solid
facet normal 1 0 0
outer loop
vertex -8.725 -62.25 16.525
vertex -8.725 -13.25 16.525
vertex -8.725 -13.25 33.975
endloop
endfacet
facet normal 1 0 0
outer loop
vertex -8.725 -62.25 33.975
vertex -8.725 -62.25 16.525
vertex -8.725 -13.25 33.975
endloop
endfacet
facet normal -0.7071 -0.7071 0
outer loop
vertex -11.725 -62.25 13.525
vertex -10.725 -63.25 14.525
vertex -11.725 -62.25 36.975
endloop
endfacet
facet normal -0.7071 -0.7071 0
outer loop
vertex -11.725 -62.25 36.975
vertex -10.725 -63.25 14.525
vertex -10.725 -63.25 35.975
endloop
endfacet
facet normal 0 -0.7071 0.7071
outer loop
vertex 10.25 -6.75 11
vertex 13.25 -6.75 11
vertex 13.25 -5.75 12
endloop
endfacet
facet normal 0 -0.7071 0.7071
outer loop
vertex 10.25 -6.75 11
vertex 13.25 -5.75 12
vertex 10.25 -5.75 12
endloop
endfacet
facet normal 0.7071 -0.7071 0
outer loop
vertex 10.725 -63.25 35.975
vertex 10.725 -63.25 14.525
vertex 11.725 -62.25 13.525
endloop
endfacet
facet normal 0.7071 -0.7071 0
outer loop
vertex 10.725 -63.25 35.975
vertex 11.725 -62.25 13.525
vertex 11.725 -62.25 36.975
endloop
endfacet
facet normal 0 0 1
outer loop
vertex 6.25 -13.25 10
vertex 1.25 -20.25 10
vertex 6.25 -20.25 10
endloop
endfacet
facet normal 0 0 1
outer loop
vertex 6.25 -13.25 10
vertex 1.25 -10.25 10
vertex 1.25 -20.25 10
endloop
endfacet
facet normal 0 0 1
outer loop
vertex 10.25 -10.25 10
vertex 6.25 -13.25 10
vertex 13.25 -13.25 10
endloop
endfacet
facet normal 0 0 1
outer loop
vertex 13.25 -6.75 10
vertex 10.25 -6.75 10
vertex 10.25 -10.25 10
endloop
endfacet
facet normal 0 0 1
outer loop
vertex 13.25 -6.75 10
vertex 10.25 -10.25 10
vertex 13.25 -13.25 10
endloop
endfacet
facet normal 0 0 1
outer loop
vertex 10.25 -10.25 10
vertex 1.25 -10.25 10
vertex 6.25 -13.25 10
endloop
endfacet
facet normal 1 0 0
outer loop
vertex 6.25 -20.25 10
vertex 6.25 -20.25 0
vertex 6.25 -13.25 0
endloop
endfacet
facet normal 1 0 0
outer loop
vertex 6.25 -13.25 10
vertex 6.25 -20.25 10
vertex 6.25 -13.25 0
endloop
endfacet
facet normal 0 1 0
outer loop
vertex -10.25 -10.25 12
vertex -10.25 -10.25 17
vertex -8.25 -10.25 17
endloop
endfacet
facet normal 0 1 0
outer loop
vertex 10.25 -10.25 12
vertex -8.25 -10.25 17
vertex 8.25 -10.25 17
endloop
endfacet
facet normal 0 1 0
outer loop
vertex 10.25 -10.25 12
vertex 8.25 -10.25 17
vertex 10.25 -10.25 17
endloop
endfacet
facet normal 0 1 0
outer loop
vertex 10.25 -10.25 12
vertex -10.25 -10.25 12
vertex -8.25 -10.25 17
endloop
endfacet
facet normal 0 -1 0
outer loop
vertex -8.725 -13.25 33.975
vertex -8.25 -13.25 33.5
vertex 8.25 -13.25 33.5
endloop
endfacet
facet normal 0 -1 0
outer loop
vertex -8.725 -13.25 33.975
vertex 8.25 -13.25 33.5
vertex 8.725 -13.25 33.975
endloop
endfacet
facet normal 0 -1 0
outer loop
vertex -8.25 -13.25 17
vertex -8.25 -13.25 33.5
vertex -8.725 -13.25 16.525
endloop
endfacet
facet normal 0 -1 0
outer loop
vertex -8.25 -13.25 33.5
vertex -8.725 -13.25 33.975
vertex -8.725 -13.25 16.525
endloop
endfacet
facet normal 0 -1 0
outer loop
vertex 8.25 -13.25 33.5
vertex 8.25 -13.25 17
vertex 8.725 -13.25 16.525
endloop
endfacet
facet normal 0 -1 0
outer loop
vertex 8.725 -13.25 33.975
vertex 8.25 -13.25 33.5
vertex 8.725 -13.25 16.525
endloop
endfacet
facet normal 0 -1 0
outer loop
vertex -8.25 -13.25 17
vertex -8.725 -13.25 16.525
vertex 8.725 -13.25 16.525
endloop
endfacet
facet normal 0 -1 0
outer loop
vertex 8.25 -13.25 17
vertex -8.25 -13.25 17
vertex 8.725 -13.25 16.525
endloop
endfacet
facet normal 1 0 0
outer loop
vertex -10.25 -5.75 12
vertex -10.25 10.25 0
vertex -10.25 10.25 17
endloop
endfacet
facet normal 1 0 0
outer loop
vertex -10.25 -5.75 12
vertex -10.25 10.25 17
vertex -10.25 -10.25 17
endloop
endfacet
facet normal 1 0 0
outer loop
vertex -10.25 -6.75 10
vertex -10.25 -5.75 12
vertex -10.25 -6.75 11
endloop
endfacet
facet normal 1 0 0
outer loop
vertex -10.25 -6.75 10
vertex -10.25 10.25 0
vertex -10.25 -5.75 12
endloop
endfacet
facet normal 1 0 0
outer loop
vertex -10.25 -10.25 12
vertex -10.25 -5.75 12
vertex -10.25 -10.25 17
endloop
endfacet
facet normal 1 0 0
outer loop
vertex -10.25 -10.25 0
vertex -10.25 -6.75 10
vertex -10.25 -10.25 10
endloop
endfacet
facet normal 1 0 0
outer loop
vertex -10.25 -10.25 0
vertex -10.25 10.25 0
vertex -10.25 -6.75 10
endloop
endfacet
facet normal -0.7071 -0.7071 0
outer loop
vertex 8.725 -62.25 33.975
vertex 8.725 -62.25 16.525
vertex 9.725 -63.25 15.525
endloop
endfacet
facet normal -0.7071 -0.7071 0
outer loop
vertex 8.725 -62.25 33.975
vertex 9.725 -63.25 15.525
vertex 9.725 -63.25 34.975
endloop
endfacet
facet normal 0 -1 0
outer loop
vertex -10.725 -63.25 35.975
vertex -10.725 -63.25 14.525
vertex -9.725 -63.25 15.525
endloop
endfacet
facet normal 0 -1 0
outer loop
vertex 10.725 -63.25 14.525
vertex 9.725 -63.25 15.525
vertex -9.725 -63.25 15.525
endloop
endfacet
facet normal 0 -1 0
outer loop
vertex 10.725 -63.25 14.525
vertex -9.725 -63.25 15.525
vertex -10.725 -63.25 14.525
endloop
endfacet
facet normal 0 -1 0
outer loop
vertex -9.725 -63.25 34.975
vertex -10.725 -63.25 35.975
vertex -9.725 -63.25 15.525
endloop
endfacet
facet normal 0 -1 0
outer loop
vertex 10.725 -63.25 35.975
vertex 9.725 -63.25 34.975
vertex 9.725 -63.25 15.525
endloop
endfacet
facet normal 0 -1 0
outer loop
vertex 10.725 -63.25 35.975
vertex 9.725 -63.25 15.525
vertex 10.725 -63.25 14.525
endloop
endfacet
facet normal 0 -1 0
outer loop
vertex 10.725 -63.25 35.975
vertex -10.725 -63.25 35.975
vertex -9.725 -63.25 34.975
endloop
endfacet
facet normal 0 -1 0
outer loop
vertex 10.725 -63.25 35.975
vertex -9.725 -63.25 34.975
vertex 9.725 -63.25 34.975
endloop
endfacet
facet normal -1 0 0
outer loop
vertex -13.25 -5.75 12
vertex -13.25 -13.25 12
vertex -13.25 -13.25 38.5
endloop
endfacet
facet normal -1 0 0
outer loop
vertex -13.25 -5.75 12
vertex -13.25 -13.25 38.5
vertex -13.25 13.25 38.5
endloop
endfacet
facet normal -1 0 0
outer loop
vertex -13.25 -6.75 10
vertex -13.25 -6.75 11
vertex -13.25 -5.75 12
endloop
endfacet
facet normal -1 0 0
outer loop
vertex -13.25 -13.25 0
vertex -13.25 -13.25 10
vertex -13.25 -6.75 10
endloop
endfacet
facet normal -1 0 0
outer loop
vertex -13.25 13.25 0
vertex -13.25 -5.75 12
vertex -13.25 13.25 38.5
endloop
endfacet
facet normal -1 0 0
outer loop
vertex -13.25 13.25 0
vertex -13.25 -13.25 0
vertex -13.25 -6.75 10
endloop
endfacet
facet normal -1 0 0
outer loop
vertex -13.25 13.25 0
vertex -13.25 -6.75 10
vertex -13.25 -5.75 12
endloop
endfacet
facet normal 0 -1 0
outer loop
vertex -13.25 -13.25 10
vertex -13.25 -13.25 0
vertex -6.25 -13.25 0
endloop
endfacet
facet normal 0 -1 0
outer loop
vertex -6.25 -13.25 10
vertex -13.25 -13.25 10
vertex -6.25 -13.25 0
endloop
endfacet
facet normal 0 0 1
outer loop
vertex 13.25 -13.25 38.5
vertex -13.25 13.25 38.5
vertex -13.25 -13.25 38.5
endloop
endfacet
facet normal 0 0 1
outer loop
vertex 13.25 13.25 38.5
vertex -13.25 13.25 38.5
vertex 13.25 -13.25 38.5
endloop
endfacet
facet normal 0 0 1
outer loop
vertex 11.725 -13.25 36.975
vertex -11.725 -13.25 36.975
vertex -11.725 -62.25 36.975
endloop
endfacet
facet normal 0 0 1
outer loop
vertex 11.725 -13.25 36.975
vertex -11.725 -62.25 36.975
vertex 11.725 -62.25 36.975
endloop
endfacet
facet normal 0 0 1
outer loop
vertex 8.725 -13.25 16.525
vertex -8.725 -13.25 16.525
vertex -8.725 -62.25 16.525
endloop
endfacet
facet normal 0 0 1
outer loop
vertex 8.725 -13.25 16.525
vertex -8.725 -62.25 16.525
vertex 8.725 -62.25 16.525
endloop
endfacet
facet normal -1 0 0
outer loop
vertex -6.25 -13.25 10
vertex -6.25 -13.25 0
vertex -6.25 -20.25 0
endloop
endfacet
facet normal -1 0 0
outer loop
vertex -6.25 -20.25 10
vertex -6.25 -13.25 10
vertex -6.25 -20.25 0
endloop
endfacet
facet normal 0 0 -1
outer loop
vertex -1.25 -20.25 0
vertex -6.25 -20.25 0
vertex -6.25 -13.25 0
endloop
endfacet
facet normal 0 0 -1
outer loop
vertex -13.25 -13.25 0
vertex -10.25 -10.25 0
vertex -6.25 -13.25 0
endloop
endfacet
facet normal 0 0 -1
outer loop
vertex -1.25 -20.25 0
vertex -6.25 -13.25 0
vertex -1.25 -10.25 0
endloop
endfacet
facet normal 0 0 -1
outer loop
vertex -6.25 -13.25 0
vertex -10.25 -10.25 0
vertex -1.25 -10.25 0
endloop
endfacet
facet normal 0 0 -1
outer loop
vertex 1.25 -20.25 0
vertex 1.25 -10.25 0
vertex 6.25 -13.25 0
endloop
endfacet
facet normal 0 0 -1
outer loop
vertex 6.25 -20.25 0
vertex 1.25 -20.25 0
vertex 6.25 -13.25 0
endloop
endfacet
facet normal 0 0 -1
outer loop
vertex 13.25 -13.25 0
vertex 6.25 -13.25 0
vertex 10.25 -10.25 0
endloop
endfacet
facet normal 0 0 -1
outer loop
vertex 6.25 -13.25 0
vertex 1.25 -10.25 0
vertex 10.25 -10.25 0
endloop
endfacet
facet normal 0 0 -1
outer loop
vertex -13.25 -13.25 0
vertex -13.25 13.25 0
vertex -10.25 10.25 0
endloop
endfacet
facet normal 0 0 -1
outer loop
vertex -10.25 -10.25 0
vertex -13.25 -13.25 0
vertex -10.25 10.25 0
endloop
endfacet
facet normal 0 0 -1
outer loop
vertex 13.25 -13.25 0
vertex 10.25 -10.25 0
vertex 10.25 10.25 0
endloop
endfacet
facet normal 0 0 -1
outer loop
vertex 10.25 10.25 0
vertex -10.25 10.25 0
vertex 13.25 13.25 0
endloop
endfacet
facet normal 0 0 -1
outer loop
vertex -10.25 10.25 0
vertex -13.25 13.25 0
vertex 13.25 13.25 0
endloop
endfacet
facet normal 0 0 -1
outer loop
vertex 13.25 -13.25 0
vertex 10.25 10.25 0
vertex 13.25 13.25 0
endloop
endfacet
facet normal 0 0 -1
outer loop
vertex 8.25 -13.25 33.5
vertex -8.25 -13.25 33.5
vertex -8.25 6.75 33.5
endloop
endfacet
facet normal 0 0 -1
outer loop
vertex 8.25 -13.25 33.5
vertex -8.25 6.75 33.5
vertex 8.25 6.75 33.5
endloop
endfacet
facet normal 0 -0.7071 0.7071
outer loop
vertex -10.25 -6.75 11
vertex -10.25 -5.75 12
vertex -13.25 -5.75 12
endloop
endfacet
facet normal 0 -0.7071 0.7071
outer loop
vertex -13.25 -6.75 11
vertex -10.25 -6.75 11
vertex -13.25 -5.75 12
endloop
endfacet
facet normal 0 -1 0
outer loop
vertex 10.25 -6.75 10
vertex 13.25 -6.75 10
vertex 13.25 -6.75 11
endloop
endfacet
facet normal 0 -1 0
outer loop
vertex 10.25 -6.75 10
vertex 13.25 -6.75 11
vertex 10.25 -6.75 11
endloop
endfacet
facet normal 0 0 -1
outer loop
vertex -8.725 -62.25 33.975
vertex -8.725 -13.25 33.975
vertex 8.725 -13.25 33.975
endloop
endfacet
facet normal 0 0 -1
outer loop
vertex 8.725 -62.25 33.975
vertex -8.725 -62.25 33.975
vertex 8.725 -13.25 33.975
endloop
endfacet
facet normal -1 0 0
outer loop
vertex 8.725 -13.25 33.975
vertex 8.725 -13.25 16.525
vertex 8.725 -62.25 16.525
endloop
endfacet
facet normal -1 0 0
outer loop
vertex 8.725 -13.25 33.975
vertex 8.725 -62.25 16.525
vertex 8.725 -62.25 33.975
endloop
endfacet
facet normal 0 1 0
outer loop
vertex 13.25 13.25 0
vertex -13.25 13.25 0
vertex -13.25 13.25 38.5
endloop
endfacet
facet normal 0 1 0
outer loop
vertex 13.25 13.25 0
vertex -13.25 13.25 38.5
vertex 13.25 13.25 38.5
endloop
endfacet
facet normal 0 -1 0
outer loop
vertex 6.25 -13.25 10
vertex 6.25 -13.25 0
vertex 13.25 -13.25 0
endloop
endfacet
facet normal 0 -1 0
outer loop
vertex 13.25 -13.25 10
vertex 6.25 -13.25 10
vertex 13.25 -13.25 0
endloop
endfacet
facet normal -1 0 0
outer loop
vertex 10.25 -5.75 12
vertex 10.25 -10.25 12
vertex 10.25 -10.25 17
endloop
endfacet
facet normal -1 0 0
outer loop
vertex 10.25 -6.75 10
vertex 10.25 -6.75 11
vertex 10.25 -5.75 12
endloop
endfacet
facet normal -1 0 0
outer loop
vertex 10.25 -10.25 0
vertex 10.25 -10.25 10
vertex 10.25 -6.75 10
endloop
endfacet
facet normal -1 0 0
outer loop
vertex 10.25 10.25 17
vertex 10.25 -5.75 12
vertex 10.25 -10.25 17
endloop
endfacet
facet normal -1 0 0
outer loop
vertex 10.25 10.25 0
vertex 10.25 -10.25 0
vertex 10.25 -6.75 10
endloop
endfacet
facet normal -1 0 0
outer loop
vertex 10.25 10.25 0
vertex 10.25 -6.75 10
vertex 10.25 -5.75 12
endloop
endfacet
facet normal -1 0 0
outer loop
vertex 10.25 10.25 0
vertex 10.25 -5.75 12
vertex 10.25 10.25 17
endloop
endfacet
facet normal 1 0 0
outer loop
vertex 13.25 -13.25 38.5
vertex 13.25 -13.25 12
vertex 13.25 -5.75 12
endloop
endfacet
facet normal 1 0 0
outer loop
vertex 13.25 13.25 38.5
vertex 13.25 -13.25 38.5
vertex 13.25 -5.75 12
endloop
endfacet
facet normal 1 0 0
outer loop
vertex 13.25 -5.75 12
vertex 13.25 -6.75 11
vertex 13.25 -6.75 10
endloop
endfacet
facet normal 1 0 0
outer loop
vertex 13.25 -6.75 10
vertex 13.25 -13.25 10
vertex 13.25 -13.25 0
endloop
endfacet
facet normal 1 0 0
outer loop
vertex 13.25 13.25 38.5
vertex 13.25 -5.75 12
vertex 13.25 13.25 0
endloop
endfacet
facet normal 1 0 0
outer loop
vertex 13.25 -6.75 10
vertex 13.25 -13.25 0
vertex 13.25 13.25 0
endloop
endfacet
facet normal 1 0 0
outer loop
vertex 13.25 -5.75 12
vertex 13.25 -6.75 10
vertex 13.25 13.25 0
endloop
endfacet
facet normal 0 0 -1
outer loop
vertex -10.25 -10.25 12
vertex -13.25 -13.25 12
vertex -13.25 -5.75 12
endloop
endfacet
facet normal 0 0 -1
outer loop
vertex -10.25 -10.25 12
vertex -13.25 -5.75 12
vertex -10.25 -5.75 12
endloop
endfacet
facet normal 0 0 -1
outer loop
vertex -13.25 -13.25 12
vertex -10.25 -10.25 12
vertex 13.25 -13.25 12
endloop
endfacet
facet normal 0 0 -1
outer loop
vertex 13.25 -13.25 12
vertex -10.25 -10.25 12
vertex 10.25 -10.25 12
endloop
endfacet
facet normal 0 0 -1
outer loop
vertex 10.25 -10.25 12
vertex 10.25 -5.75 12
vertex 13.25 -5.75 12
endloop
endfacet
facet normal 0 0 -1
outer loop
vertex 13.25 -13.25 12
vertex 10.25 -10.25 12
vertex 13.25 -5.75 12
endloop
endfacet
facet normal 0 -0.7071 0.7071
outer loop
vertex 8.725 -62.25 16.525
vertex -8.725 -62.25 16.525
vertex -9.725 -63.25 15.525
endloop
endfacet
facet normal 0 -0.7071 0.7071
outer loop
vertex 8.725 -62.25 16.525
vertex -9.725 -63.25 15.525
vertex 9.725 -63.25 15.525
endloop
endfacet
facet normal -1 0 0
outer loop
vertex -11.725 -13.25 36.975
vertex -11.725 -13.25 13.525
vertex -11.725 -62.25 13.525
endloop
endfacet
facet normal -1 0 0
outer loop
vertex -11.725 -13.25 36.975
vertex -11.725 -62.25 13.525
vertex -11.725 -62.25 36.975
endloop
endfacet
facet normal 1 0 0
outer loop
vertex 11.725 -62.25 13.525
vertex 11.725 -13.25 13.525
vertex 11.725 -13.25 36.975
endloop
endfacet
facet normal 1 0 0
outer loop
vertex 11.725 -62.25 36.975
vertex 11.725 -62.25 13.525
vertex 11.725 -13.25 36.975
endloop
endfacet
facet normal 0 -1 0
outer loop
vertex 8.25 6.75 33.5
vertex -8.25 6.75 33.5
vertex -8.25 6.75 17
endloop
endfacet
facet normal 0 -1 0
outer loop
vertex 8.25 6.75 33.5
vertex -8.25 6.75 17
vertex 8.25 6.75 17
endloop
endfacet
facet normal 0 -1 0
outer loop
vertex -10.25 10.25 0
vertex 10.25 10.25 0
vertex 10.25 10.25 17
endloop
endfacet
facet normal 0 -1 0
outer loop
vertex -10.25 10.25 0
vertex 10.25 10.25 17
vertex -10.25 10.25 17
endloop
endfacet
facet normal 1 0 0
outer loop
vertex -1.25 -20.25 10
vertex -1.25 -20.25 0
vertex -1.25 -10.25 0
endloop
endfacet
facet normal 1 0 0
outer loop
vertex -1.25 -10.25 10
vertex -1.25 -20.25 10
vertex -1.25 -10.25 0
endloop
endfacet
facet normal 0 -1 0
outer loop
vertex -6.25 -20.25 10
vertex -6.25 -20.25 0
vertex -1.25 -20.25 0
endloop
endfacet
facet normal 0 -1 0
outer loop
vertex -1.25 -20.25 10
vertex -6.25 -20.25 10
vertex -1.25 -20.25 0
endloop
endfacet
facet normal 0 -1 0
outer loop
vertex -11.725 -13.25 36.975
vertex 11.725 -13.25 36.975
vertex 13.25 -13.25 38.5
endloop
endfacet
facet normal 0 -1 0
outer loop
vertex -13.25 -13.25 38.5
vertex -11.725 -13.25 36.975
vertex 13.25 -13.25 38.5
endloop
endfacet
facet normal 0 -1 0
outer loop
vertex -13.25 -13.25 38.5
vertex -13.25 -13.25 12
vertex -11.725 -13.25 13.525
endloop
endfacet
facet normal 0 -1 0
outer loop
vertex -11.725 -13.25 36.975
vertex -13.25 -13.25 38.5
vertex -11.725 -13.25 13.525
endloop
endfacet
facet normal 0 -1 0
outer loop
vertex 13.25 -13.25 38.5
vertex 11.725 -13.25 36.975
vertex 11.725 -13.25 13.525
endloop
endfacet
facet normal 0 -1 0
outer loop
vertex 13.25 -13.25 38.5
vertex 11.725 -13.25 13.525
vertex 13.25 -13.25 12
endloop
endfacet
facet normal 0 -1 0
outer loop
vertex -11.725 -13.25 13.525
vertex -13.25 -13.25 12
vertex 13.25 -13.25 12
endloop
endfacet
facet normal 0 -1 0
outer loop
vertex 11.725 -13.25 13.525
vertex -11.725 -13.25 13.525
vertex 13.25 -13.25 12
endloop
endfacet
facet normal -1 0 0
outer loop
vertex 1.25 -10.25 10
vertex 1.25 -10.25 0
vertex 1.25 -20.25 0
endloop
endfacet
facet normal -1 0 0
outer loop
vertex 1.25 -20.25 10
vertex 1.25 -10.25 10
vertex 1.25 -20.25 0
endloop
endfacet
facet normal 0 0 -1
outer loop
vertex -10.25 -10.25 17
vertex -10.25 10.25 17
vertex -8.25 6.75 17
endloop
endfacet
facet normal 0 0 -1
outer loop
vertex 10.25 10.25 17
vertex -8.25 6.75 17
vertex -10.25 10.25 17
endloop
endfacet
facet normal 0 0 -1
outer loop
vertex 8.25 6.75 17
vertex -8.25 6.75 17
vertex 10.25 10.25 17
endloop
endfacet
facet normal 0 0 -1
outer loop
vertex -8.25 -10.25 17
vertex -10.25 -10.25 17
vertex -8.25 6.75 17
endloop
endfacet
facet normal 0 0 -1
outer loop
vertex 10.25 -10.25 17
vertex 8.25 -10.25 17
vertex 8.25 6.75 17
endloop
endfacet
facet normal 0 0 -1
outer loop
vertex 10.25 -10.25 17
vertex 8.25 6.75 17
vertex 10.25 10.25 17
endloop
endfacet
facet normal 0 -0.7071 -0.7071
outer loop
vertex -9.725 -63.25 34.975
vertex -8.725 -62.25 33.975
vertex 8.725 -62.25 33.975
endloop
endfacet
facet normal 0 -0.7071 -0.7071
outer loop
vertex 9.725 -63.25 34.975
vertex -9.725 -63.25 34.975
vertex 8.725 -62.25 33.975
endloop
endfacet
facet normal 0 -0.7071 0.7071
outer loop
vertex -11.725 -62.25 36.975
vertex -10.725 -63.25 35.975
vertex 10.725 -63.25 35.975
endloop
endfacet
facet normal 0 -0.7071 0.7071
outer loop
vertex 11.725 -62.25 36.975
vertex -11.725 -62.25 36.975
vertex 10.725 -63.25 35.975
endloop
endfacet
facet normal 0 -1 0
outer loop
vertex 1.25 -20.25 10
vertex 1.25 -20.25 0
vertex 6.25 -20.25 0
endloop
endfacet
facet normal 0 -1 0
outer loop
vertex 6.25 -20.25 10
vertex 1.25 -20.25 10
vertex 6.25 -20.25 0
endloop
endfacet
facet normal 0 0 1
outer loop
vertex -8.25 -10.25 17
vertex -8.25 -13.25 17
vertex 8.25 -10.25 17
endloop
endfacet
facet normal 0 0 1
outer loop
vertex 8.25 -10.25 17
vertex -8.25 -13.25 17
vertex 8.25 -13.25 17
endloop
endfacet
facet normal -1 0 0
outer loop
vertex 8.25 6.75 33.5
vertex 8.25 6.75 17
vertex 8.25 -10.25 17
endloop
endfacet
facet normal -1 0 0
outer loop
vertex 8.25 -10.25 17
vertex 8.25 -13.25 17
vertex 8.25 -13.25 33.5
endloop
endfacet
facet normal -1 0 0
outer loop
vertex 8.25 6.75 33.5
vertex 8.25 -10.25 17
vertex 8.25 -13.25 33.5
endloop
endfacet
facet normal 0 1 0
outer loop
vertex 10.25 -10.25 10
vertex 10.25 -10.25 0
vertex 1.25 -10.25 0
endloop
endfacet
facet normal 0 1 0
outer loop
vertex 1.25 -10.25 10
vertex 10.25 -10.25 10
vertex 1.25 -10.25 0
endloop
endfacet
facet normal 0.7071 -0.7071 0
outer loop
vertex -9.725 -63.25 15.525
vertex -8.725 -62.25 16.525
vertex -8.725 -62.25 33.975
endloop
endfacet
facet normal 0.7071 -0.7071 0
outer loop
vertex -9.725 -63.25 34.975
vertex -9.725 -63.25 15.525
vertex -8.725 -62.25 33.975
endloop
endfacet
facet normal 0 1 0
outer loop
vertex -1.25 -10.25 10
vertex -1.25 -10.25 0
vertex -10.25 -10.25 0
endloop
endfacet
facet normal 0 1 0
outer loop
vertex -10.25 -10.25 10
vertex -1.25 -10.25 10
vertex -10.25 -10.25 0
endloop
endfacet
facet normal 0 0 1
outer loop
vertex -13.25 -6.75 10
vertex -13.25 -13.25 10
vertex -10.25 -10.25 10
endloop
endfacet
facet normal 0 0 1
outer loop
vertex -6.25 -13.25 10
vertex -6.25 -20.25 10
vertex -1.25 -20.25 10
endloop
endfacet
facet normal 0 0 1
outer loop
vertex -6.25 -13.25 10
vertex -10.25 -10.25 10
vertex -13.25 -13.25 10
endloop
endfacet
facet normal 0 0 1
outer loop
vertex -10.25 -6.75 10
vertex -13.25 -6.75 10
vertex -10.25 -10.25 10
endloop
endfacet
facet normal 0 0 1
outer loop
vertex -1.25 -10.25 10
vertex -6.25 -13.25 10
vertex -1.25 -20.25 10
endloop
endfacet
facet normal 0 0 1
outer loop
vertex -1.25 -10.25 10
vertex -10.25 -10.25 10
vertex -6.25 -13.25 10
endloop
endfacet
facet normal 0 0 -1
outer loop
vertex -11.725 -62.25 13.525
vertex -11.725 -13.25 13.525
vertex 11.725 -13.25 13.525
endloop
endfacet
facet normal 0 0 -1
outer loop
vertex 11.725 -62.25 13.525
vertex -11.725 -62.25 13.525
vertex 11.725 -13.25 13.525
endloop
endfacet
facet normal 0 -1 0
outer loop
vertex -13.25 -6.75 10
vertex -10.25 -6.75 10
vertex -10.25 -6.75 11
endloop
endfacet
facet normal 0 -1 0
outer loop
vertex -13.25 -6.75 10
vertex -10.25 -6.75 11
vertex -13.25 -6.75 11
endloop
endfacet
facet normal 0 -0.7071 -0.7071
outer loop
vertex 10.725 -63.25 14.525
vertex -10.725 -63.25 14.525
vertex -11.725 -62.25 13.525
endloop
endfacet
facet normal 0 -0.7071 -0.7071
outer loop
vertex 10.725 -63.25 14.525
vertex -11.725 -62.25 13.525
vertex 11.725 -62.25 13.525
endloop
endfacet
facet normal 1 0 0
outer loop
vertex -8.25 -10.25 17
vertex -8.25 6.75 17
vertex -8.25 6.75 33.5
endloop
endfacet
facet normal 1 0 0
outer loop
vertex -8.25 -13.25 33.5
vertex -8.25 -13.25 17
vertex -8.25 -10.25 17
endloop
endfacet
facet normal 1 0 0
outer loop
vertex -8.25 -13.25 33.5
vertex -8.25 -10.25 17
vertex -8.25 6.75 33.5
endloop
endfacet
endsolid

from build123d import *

# Parameters (mm, degrees)
PAD_DEPTH       = 10
PAD001_DEPTH    = 2
CHAMFER_SIZE    = 1
SKETCH002_W     = 26.5
SKETCH002_H     = 26.5
PAD002_DEPTH    = 26.5
SKETCH003_W     = 16.5
SKETCH003_H     = 16.5
POCKET_DEPTH    = 20
SKETCH004_W     = 20.5
SKETCH004_H     = 20.5
POCKET001_DEPTH = 5
SKETCH005_W     = 23.45
SKETCH005_H     = 23.45
SKETCH005_W_2   = 17.45
SKETCH005_H_2   = 17.45
PAD003_DEPTH    = 50
CHAMFER001_SIZE = 1


with BuildPart() as part:
    # Sketch → Pad (new body)
    with BuildSketch(Plane.XY):
        Polygon((6.25, -20.25), (6.25, -13.25), (13.25, -13.25), (13.25, 13.25), (-13.25, 13.25), (-13.25, -13.25), (-6.25, -13.25), (-6.25, -20.25), (-1.25, -20.25), (-1.25, -10.25), (-10.25, -10.25), (-10.25, 10.25), (10.25, 10.25), (10.25, -10.25), (1.25, -10.25), (1.25, -20.25), align=None)
    extrude(amount=PAD_DEPTH)

    # Sketch001 (on Face18 of Pad) → Pad001 (join)
    with BuildSketch(Plane.XY.offset(10)):
        Polygon((-10.25, -6.75), (-13.25, -6.75), (-13.25, 13.25), (13.25, 13.25), (13.25, -6.75), (10.25, -6.75), (10.25, 10.25), (-10.25, 10.25), align=None)
    extrude(amount=PAD001_DEPTH)

    # Chamfer
    chamfer_edges = [part.edges().sort_by_distance(p)[0] for p in [
        (-11.75, -6.75, 12),
        (11.75, -6.75, 12),
    ]]
    chamfer(chamfer_edges, length=CHAMFER_SIZE)

    # Sketch002 (on Face7 of Chamfer) → Pad002 (join)
    with BuildSketch(Plane.XY.offset(12)):
        Rectangle(SKETCH002_W, SKETCH002_H)
    extrude(amount=PAD002_DEPTH)

    # Sketch003 (on Face20 of Pad002) → Pocket (cut)
    with BuildSketch(Plane.XZ.offset(13.25)):
        with Locations((0, 25.25)):
            Rectangle(SKETCH003_W, SKETCH003_H)
    extrude(amount=-POCKET_DEPTH, mode=Mode.SUBTRACT)

    # Sketch004 (on Face9 of Pocket) → Pocket001 (cut)
    with BuildSketch(Plane(origin=(0, 0, 12), x_dir=(1, 0, 0), z_dir=(0, 0, -1))):
        Rectangle(SKETCH004_W, SKETCH004_H)
    extrude(amount=-POCKET001_DEPTH, mode=Mode.SUBTRACT)

    # Sketch005 (on Face21 of Pocket001) → Pad003 (join)
    with BuildSketch(Plane.XZ.offset(13.25)):
        with Locations((0, 25.25)):
            Rectangle(SKETCH005_W, SKETCH005_H)
        with Locations((0, 25.25)):
            Rectangle(SKETCH005_W_2, SKETCH005_H_2, mode=Mode.SUBTRACT)
    extrude(amount=PAD003_DEPTH)

    # Chamfer001
    chamfer001_edges = [part.edges().sort_by_distance(p)[0] for p in [
        (0, -63.25, 36.975),
        (11.725, -63.25, 25.25),
        (0, -63.25, 13.525),
        (-11.725, -63.25, 25.25),
        (0, -63.25, 33.975),
        (8.725, -63.25, 25.25),
        (0, -63.25, 16.525),
        (-8.725, -63.25, 25.25),
    ]]
    chamfer(chamfer001_edges, length=CHAMFER001_SIZE)


solid = part.part
